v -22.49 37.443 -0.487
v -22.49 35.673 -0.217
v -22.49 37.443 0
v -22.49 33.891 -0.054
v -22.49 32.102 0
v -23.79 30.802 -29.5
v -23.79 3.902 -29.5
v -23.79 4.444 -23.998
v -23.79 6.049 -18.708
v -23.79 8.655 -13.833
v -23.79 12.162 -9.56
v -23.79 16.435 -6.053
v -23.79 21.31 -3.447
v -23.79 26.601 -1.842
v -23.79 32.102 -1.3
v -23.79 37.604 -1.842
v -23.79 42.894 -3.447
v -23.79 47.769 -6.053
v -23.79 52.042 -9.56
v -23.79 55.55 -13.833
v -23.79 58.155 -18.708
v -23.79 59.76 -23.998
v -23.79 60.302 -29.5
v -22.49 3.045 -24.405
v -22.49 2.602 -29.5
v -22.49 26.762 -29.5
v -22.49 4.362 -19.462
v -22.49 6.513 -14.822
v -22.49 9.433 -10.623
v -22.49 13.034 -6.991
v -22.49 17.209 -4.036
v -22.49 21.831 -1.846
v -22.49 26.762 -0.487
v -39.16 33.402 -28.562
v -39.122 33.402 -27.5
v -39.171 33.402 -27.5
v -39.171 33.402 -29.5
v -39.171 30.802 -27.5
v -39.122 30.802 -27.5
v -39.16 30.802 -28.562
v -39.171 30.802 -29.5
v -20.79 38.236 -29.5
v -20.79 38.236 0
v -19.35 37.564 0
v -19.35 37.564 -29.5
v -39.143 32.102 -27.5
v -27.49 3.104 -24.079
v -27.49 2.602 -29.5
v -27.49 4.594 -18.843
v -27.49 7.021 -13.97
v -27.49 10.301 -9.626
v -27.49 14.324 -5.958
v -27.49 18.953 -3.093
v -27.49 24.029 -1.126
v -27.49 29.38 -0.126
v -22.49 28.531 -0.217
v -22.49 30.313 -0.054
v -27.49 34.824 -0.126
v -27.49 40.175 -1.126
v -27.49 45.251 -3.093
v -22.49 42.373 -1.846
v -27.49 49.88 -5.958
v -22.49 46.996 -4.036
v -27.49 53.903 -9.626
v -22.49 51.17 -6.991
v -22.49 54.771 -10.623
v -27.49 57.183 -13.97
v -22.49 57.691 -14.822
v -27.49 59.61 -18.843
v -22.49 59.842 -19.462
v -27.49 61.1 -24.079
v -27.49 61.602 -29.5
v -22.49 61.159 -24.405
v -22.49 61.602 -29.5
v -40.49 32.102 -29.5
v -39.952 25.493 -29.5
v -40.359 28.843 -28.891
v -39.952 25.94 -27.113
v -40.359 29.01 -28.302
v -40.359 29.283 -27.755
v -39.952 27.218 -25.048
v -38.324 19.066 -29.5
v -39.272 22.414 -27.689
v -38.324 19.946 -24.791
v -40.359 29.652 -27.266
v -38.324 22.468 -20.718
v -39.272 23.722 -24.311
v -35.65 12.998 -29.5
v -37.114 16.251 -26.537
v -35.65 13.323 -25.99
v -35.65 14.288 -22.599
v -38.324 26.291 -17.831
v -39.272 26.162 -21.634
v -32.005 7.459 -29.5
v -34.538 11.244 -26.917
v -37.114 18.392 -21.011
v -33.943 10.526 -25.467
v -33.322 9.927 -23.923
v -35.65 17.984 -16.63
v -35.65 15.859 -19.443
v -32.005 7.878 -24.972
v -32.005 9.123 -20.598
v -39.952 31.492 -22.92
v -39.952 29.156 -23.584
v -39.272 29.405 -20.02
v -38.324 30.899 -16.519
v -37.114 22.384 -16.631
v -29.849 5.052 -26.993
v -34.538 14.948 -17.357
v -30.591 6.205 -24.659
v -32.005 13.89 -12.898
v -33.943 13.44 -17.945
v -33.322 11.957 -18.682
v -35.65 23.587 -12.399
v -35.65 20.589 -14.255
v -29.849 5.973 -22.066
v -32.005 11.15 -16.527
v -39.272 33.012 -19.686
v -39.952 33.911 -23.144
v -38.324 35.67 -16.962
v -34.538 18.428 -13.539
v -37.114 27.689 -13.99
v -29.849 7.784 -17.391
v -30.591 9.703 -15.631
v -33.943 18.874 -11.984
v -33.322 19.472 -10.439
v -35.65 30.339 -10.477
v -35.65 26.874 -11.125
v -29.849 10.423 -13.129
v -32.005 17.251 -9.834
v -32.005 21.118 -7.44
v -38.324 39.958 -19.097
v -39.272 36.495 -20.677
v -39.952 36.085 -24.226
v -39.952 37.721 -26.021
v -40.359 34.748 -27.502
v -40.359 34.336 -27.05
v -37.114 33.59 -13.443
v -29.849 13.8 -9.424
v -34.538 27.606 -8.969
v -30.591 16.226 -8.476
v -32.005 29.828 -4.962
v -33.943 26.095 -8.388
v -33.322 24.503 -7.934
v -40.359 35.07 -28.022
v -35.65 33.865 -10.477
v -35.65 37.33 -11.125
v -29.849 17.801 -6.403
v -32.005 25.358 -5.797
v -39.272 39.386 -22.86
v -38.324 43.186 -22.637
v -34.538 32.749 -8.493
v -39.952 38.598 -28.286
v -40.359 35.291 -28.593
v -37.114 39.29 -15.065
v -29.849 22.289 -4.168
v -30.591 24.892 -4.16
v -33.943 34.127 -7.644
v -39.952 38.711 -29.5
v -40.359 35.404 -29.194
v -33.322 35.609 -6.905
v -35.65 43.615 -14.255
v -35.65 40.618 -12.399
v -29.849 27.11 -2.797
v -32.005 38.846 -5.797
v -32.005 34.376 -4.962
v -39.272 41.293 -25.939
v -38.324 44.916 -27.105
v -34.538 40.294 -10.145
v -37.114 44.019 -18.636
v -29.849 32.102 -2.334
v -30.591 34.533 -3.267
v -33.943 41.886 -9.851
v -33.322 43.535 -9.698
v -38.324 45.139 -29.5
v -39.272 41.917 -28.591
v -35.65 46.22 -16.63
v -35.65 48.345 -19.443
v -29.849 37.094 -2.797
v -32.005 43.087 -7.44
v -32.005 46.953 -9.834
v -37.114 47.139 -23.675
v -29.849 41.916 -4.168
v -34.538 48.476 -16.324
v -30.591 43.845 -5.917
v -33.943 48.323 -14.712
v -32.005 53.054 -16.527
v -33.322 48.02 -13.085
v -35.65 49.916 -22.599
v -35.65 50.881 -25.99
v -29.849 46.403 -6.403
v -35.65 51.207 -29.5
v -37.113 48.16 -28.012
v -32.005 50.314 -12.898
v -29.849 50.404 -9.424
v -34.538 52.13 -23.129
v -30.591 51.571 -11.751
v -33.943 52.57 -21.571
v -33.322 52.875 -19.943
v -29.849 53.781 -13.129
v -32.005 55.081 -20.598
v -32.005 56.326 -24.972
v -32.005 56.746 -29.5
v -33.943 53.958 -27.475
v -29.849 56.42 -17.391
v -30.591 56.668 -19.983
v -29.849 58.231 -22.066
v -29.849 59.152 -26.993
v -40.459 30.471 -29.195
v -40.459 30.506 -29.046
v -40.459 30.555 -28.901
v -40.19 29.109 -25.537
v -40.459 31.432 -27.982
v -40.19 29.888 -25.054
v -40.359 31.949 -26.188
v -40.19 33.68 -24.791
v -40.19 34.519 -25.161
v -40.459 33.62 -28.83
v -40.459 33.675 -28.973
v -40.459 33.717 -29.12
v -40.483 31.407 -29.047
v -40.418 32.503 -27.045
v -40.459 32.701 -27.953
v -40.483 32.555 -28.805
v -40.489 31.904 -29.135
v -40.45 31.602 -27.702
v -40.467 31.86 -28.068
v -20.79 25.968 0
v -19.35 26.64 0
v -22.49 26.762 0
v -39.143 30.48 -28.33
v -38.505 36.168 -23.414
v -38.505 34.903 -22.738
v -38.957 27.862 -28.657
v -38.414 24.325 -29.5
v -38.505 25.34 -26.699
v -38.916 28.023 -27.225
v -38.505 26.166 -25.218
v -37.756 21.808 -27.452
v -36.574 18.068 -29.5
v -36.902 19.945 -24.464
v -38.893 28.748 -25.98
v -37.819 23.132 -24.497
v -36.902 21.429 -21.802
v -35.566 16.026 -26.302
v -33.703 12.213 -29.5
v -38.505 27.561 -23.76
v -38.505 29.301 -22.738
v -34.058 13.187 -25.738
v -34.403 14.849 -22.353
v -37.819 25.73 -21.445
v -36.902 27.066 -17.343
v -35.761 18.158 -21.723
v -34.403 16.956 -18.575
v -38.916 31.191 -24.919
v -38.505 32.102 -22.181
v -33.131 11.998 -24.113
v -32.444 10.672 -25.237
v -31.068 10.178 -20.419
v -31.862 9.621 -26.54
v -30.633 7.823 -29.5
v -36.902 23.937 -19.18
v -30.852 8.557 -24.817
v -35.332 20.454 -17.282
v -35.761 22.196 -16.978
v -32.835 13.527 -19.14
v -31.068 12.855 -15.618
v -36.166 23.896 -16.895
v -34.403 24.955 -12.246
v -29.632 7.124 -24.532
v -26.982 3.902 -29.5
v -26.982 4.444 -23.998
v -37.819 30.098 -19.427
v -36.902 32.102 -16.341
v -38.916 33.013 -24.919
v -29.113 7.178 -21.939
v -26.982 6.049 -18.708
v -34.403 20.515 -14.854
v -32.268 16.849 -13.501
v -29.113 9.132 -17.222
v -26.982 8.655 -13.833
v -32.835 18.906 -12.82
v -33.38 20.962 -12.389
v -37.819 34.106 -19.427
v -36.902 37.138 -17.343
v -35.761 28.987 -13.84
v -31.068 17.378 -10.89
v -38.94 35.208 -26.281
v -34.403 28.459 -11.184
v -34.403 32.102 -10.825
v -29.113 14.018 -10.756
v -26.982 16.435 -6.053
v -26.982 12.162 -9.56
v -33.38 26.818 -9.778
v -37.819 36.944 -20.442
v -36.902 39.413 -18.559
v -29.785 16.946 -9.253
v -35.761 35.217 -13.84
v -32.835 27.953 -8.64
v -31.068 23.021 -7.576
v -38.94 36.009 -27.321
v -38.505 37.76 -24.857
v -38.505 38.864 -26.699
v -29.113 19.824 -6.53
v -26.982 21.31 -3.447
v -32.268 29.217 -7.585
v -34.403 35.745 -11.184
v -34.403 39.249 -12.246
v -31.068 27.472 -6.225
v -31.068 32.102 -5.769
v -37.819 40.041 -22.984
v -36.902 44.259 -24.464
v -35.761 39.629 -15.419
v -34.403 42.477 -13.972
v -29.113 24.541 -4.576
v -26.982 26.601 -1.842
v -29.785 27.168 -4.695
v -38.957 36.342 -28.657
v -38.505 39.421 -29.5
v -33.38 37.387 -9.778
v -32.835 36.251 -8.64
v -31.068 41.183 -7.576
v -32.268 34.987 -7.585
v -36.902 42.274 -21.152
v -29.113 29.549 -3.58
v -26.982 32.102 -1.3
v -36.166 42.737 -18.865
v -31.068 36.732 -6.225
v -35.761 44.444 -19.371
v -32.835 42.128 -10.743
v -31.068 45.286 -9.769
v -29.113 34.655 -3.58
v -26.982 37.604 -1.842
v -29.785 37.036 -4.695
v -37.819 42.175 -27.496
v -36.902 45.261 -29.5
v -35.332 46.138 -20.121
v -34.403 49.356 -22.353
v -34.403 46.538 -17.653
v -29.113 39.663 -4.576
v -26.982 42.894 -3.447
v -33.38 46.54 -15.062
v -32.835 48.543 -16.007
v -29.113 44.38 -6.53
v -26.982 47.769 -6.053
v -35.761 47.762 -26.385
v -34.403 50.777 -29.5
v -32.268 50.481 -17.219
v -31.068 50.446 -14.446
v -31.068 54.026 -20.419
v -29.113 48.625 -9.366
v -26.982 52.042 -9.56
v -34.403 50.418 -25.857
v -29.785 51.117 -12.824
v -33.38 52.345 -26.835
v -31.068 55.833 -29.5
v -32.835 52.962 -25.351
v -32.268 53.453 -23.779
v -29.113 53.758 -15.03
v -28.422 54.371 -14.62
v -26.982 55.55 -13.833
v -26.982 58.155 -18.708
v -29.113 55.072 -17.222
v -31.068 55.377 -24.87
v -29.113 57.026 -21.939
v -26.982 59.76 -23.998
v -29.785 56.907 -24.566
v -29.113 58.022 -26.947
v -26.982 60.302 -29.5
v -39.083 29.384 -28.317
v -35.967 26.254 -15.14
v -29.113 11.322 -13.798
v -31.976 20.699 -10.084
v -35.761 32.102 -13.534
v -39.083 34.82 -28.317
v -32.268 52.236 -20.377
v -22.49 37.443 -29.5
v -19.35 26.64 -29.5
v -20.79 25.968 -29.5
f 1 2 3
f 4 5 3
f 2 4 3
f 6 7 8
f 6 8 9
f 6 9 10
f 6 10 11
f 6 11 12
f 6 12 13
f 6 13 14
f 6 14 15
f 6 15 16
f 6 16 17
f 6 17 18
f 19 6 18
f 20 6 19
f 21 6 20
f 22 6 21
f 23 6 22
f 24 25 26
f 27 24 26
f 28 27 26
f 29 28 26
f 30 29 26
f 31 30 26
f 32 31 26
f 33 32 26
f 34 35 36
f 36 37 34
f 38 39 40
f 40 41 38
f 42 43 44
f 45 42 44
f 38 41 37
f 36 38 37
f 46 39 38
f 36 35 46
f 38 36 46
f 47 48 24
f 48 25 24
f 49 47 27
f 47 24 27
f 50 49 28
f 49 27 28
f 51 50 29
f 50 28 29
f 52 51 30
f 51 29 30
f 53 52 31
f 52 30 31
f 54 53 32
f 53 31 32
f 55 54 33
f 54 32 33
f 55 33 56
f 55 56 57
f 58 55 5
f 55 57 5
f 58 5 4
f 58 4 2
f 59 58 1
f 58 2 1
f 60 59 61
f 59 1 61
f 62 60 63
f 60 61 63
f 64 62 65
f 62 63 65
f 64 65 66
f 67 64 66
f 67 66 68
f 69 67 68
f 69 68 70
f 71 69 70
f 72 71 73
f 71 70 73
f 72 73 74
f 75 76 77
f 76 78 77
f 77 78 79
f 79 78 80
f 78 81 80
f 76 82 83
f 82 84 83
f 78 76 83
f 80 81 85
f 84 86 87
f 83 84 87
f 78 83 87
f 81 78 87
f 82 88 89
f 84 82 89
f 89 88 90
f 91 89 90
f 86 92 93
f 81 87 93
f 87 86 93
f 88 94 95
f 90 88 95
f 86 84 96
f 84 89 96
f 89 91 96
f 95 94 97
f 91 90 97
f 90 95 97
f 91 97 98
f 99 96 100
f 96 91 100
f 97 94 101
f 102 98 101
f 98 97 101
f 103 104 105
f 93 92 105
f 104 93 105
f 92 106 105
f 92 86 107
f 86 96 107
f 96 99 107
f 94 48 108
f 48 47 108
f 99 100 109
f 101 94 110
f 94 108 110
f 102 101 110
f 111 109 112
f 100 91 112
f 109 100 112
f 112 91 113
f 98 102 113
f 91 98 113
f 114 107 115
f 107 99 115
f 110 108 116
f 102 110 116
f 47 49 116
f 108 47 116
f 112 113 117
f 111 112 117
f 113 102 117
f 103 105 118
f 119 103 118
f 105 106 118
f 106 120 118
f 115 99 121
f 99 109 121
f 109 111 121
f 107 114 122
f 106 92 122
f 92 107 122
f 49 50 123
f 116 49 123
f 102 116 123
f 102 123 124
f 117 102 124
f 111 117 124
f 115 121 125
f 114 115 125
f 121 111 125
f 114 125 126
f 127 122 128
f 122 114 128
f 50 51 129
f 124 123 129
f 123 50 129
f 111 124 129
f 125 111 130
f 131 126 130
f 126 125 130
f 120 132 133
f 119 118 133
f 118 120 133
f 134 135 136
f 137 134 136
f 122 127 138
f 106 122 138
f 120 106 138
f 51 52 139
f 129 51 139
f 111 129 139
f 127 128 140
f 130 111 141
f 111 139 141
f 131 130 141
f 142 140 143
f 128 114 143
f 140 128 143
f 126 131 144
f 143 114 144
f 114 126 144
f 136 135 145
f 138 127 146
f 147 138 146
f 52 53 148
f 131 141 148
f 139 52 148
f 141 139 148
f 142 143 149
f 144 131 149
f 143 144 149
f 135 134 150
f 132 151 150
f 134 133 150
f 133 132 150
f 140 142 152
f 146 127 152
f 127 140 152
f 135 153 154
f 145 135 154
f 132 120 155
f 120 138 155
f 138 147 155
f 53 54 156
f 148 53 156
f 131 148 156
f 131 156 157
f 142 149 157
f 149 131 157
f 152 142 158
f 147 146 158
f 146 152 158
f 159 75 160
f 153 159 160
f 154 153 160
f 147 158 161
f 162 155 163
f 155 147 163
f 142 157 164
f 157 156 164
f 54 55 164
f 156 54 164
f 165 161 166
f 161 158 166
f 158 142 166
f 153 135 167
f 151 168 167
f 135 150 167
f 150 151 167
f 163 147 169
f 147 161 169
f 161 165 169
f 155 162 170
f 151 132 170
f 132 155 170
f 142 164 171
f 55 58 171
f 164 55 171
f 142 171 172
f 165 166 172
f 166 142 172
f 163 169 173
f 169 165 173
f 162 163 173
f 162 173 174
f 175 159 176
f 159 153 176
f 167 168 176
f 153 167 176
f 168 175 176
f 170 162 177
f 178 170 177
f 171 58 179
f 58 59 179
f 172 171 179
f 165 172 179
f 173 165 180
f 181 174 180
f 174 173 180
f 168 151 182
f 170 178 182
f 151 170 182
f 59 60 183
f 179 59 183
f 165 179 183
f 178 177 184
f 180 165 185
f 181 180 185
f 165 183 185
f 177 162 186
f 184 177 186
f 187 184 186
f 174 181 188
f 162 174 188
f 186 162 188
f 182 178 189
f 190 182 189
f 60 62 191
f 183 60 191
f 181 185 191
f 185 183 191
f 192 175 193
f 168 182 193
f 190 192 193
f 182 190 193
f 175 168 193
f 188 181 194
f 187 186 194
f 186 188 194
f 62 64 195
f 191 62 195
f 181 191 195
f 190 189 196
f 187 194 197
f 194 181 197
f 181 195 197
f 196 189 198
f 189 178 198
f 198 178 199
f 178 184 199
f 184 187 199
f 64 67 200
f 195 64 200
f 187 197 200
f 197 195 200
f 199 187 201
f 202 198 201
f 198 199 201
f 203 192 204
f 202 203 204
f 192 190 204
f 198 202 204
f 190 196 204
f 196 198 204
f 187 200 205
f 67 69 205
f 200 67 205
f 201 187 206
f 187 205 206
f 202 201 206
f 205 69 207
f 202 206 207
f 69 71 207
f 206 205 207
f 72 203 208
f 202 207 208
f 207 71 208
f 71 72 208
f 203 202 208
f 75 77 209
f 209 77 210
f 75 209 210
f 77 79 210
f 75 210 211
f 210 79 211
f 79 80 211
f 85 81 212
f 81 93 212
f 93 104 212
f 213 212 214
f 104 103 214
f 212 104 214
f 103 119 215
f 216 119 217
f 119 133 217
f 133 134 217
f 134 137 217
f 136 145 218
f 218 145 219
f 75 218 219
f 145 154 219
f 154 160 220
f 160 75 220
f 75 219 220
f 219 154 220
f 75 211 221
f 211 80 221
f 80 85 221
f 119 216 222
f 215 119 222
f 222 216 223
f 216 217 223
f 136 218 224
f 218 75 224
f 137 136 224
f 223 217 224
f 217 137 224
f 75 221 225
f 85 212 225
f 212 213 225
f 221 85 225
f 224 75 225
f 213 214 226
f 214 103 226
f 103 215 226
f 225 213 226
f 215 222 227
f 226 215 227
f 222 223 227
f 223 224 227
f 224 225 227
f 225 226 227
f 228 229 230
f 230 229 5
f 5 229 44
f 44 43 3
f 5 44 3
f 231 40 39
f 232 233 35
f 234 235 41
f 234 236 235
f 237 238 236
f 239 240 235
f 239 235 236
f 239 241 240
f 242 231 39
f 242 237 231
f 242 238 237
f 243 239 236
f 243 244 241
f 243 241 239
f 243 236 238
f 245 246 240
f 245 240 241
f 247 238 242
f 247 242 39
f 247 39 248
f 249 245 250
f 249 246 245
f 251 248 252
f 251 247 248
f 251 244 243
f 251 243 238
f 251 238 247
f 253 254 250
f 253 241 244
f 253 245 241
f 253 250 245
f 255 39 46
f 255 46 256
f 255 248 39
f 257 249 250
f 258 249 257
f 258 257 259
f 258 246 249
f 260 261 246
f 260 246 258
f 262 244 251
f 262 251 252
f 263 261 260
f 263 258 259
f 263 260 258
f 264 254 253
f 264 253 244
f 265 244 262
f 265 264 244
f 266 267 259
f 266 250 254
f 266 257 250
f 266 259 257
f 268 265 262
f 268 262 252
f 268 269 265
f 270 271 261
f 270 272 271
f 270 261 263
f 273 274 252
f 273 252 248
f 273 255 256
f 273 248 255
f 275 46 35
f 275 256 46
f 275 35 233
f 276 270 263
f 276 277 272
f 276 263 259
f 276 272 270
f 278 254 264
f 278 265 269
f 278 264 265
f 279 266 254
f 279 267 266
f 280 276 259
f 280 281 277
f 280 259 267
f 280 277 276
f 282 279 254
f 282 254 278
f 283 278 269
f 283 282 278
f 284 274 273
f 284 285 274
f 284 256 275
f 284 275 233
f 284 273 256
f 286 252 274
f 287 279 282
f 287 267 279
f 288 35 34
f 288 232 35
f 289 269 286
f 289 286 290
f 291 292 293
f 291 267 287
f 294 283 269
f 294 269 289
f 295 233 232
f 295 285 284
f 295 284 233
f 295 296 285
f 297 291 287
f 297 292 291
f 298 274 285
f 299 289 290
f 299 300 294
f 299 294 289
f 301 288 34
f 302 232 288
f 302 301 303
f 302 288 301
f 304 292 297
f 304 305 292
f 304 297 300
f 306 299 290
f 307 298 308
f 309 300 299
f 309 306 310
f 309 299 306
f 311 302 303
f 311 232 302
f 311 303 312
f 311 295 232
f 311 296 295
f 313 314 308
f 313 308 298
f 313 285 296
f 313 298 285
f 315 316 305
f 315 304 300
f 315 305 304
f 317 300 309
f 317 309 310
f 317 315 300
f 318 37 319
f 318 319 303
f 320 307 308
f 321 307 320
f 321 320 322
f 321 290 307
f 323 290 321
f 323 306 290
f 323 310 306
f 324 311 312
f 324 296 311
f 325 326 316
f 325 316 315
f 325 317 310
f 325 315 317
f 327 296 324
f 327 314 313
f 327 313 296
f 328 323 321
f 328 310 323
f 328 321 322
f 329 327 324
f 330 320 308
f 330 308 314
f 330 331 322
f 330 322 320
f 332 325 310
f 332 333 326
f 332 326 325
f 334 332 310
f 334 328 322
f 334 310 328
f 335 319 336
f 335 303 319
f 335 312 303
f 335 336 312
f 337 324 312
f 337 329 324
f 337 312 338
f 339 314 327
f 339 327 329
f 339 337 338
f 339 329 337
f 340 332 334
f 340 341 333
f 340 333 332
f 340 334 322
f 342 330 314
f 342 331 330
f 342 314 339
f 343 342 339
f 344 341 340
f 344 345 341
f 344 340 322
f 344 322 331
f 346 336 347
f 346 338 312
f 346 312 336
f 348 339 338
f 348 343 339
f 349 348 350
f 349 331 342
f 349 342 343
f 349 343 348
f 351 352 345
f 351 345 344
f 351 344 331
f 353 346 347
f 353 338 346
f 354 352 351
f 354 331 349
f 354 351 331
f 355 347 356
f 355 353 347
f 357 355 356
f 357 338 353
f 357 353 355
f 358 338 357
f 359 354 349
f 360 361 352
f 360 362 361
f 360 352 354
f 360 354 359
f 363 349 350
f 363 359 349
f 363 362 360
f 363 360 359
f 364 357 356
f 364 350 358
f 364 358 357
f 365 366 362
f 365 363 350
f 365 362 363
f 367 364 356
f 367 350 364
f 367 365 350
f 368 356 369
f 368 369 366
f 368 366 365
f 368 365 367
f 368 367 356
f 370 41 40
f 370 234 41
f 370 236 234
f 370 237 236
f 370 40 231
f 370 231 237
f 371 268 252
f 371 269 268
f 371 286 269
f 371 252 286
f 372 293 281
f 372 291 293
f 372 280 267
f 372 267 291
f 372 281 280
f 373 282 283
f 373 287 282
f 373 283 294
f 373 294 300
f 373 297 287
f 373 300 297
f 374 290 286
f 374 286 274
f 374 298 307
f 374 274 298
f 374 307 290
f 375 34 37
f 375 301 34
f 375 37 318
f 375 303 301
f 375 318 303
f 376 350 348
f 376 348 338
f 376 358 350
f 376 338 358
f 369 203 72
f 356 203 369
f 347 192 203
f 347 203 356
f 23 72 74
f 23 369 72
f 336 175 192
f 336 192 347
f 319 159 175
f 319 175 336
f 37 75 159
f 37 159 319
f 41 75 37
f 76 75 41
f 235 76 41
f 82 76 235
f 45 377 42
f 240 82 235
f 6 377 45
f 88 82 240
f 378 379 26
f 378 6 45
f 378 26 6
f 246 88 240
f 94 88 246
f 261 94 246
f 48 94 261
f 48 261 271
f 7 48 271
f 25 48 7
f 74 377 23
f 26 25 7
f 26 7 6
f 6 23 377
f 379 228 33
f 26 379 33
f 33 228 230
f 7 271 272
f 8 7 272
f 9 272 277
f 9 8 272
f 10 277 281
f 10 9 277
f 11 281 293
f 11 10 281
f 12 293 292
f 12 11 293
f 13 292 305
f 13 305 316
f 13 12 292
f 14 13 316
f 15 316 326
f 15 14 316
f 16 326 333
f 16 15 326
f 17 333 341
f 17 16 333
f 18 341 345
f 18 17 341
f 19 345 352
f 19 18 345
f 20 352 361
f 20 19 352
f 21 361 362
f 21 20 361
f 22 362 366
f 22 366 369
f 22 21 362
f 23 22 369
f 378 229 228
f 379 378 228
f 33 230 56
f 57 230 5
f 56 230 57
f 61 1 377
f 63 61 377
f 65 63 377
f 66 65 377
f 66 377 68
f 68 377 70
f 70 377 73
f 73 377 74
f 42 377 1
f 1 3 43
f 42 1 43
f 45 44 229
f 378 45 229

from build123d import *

# Parameters (mm, degrees)
BOSS_EXTRUDE1_DEPTH = 29.5
SKETCH4_W           = 50
SKETCH4_H           = 35
CUT_EXTRUDE1_DEPTH  = 68
SKETCH5_W           = 15.381078853
SKETCH5_H           = 2.6
CUT_EXTRUDE2_DEPTH  = 2


with BuildPart() as part:
    # Sketch1 → Boss-Extrude1 (new body)
    with BuildSketch(Plane.XY):
        Polygon((-22.49, 37.442535728), (-20.79, 38.235869061), (-19.35, 37.563869061), (-19.35, 26.640292624), (-20.79, 25.968292624), (-22.49, 26.761625958), align=None)
    extrude(amount=-BOSS_EXTRUDE1_DEPTH)

    # Sketch3 → Revolve1 (revolve)
    with BuildSketch(Plane(origin=(0, 32.102080843, 0), x_dir=(-1, 0, 0), z_dir=(0, -1, 0)), mode=Mode.PRIVATE) as revolve1_sk:
        with BuildLine():
            Line((22.49, 29.5), (40.49, 29.5))
            ThreePointArc((40.49, 29.5), (37.113405562, 13.37358399), (27.49, 0))
            Line((27.49, 0), (22.49, 0))
            Line((22.49, 0), (22.49, 29.5))
        make_face()
        with BuildLine():
            Line((23.79, 28.2), (39.171078853, 28.2))
            ThreePointArc((39.171078853, 28.2), (35.761046656, 13.533638438), (26.982175907, 1.3))
            Line((26.982175907, 1.3), (23.79, 1.3))
            Line((23.79, 1.3), (23.79, 28.2))
        make_face(mode=Mode.SUBTRACT)
    revolve(revolve1_sk.sketch.rotate(Axis((-22.49, 32.102080843, -29.5), (-1, 0, 0)), 90), axis=Axis((-22.49, 32.102080843, -29.5), (-1, 0, 0)))

    # Sketch4 → Cut-Extrude1 (cut)
    with BuildSketch(Plane(origin=(0, 0, 0), x_dir=(1, 0, 0), z_dir=(0, 1, 0))):
        with Locations((-35.281230145, 47)):
            Rectangle(SKETCH4_W, SKETCH4_H)
    extrude(amount=CUT_EXTRUDE1_DEPTH, mode=Mode.SUBTRACT)

    # Sketch5 → Cut-Extrude2 (cut)
    with BuildSketch(Plane(origin=(0, 0, -29.5), x_dir=(-1, 0, 0), z_dir=(0, 0, -1))):
        with Locations((31.480539427, 32.102080843)):
            Rectangle(SKETCH5_W, SKETCH5_H)
    extrude(amount=-CUT_EXTRUDE2_DEPTH, mode=Mode.SUBTRACT)


solid = part.part
